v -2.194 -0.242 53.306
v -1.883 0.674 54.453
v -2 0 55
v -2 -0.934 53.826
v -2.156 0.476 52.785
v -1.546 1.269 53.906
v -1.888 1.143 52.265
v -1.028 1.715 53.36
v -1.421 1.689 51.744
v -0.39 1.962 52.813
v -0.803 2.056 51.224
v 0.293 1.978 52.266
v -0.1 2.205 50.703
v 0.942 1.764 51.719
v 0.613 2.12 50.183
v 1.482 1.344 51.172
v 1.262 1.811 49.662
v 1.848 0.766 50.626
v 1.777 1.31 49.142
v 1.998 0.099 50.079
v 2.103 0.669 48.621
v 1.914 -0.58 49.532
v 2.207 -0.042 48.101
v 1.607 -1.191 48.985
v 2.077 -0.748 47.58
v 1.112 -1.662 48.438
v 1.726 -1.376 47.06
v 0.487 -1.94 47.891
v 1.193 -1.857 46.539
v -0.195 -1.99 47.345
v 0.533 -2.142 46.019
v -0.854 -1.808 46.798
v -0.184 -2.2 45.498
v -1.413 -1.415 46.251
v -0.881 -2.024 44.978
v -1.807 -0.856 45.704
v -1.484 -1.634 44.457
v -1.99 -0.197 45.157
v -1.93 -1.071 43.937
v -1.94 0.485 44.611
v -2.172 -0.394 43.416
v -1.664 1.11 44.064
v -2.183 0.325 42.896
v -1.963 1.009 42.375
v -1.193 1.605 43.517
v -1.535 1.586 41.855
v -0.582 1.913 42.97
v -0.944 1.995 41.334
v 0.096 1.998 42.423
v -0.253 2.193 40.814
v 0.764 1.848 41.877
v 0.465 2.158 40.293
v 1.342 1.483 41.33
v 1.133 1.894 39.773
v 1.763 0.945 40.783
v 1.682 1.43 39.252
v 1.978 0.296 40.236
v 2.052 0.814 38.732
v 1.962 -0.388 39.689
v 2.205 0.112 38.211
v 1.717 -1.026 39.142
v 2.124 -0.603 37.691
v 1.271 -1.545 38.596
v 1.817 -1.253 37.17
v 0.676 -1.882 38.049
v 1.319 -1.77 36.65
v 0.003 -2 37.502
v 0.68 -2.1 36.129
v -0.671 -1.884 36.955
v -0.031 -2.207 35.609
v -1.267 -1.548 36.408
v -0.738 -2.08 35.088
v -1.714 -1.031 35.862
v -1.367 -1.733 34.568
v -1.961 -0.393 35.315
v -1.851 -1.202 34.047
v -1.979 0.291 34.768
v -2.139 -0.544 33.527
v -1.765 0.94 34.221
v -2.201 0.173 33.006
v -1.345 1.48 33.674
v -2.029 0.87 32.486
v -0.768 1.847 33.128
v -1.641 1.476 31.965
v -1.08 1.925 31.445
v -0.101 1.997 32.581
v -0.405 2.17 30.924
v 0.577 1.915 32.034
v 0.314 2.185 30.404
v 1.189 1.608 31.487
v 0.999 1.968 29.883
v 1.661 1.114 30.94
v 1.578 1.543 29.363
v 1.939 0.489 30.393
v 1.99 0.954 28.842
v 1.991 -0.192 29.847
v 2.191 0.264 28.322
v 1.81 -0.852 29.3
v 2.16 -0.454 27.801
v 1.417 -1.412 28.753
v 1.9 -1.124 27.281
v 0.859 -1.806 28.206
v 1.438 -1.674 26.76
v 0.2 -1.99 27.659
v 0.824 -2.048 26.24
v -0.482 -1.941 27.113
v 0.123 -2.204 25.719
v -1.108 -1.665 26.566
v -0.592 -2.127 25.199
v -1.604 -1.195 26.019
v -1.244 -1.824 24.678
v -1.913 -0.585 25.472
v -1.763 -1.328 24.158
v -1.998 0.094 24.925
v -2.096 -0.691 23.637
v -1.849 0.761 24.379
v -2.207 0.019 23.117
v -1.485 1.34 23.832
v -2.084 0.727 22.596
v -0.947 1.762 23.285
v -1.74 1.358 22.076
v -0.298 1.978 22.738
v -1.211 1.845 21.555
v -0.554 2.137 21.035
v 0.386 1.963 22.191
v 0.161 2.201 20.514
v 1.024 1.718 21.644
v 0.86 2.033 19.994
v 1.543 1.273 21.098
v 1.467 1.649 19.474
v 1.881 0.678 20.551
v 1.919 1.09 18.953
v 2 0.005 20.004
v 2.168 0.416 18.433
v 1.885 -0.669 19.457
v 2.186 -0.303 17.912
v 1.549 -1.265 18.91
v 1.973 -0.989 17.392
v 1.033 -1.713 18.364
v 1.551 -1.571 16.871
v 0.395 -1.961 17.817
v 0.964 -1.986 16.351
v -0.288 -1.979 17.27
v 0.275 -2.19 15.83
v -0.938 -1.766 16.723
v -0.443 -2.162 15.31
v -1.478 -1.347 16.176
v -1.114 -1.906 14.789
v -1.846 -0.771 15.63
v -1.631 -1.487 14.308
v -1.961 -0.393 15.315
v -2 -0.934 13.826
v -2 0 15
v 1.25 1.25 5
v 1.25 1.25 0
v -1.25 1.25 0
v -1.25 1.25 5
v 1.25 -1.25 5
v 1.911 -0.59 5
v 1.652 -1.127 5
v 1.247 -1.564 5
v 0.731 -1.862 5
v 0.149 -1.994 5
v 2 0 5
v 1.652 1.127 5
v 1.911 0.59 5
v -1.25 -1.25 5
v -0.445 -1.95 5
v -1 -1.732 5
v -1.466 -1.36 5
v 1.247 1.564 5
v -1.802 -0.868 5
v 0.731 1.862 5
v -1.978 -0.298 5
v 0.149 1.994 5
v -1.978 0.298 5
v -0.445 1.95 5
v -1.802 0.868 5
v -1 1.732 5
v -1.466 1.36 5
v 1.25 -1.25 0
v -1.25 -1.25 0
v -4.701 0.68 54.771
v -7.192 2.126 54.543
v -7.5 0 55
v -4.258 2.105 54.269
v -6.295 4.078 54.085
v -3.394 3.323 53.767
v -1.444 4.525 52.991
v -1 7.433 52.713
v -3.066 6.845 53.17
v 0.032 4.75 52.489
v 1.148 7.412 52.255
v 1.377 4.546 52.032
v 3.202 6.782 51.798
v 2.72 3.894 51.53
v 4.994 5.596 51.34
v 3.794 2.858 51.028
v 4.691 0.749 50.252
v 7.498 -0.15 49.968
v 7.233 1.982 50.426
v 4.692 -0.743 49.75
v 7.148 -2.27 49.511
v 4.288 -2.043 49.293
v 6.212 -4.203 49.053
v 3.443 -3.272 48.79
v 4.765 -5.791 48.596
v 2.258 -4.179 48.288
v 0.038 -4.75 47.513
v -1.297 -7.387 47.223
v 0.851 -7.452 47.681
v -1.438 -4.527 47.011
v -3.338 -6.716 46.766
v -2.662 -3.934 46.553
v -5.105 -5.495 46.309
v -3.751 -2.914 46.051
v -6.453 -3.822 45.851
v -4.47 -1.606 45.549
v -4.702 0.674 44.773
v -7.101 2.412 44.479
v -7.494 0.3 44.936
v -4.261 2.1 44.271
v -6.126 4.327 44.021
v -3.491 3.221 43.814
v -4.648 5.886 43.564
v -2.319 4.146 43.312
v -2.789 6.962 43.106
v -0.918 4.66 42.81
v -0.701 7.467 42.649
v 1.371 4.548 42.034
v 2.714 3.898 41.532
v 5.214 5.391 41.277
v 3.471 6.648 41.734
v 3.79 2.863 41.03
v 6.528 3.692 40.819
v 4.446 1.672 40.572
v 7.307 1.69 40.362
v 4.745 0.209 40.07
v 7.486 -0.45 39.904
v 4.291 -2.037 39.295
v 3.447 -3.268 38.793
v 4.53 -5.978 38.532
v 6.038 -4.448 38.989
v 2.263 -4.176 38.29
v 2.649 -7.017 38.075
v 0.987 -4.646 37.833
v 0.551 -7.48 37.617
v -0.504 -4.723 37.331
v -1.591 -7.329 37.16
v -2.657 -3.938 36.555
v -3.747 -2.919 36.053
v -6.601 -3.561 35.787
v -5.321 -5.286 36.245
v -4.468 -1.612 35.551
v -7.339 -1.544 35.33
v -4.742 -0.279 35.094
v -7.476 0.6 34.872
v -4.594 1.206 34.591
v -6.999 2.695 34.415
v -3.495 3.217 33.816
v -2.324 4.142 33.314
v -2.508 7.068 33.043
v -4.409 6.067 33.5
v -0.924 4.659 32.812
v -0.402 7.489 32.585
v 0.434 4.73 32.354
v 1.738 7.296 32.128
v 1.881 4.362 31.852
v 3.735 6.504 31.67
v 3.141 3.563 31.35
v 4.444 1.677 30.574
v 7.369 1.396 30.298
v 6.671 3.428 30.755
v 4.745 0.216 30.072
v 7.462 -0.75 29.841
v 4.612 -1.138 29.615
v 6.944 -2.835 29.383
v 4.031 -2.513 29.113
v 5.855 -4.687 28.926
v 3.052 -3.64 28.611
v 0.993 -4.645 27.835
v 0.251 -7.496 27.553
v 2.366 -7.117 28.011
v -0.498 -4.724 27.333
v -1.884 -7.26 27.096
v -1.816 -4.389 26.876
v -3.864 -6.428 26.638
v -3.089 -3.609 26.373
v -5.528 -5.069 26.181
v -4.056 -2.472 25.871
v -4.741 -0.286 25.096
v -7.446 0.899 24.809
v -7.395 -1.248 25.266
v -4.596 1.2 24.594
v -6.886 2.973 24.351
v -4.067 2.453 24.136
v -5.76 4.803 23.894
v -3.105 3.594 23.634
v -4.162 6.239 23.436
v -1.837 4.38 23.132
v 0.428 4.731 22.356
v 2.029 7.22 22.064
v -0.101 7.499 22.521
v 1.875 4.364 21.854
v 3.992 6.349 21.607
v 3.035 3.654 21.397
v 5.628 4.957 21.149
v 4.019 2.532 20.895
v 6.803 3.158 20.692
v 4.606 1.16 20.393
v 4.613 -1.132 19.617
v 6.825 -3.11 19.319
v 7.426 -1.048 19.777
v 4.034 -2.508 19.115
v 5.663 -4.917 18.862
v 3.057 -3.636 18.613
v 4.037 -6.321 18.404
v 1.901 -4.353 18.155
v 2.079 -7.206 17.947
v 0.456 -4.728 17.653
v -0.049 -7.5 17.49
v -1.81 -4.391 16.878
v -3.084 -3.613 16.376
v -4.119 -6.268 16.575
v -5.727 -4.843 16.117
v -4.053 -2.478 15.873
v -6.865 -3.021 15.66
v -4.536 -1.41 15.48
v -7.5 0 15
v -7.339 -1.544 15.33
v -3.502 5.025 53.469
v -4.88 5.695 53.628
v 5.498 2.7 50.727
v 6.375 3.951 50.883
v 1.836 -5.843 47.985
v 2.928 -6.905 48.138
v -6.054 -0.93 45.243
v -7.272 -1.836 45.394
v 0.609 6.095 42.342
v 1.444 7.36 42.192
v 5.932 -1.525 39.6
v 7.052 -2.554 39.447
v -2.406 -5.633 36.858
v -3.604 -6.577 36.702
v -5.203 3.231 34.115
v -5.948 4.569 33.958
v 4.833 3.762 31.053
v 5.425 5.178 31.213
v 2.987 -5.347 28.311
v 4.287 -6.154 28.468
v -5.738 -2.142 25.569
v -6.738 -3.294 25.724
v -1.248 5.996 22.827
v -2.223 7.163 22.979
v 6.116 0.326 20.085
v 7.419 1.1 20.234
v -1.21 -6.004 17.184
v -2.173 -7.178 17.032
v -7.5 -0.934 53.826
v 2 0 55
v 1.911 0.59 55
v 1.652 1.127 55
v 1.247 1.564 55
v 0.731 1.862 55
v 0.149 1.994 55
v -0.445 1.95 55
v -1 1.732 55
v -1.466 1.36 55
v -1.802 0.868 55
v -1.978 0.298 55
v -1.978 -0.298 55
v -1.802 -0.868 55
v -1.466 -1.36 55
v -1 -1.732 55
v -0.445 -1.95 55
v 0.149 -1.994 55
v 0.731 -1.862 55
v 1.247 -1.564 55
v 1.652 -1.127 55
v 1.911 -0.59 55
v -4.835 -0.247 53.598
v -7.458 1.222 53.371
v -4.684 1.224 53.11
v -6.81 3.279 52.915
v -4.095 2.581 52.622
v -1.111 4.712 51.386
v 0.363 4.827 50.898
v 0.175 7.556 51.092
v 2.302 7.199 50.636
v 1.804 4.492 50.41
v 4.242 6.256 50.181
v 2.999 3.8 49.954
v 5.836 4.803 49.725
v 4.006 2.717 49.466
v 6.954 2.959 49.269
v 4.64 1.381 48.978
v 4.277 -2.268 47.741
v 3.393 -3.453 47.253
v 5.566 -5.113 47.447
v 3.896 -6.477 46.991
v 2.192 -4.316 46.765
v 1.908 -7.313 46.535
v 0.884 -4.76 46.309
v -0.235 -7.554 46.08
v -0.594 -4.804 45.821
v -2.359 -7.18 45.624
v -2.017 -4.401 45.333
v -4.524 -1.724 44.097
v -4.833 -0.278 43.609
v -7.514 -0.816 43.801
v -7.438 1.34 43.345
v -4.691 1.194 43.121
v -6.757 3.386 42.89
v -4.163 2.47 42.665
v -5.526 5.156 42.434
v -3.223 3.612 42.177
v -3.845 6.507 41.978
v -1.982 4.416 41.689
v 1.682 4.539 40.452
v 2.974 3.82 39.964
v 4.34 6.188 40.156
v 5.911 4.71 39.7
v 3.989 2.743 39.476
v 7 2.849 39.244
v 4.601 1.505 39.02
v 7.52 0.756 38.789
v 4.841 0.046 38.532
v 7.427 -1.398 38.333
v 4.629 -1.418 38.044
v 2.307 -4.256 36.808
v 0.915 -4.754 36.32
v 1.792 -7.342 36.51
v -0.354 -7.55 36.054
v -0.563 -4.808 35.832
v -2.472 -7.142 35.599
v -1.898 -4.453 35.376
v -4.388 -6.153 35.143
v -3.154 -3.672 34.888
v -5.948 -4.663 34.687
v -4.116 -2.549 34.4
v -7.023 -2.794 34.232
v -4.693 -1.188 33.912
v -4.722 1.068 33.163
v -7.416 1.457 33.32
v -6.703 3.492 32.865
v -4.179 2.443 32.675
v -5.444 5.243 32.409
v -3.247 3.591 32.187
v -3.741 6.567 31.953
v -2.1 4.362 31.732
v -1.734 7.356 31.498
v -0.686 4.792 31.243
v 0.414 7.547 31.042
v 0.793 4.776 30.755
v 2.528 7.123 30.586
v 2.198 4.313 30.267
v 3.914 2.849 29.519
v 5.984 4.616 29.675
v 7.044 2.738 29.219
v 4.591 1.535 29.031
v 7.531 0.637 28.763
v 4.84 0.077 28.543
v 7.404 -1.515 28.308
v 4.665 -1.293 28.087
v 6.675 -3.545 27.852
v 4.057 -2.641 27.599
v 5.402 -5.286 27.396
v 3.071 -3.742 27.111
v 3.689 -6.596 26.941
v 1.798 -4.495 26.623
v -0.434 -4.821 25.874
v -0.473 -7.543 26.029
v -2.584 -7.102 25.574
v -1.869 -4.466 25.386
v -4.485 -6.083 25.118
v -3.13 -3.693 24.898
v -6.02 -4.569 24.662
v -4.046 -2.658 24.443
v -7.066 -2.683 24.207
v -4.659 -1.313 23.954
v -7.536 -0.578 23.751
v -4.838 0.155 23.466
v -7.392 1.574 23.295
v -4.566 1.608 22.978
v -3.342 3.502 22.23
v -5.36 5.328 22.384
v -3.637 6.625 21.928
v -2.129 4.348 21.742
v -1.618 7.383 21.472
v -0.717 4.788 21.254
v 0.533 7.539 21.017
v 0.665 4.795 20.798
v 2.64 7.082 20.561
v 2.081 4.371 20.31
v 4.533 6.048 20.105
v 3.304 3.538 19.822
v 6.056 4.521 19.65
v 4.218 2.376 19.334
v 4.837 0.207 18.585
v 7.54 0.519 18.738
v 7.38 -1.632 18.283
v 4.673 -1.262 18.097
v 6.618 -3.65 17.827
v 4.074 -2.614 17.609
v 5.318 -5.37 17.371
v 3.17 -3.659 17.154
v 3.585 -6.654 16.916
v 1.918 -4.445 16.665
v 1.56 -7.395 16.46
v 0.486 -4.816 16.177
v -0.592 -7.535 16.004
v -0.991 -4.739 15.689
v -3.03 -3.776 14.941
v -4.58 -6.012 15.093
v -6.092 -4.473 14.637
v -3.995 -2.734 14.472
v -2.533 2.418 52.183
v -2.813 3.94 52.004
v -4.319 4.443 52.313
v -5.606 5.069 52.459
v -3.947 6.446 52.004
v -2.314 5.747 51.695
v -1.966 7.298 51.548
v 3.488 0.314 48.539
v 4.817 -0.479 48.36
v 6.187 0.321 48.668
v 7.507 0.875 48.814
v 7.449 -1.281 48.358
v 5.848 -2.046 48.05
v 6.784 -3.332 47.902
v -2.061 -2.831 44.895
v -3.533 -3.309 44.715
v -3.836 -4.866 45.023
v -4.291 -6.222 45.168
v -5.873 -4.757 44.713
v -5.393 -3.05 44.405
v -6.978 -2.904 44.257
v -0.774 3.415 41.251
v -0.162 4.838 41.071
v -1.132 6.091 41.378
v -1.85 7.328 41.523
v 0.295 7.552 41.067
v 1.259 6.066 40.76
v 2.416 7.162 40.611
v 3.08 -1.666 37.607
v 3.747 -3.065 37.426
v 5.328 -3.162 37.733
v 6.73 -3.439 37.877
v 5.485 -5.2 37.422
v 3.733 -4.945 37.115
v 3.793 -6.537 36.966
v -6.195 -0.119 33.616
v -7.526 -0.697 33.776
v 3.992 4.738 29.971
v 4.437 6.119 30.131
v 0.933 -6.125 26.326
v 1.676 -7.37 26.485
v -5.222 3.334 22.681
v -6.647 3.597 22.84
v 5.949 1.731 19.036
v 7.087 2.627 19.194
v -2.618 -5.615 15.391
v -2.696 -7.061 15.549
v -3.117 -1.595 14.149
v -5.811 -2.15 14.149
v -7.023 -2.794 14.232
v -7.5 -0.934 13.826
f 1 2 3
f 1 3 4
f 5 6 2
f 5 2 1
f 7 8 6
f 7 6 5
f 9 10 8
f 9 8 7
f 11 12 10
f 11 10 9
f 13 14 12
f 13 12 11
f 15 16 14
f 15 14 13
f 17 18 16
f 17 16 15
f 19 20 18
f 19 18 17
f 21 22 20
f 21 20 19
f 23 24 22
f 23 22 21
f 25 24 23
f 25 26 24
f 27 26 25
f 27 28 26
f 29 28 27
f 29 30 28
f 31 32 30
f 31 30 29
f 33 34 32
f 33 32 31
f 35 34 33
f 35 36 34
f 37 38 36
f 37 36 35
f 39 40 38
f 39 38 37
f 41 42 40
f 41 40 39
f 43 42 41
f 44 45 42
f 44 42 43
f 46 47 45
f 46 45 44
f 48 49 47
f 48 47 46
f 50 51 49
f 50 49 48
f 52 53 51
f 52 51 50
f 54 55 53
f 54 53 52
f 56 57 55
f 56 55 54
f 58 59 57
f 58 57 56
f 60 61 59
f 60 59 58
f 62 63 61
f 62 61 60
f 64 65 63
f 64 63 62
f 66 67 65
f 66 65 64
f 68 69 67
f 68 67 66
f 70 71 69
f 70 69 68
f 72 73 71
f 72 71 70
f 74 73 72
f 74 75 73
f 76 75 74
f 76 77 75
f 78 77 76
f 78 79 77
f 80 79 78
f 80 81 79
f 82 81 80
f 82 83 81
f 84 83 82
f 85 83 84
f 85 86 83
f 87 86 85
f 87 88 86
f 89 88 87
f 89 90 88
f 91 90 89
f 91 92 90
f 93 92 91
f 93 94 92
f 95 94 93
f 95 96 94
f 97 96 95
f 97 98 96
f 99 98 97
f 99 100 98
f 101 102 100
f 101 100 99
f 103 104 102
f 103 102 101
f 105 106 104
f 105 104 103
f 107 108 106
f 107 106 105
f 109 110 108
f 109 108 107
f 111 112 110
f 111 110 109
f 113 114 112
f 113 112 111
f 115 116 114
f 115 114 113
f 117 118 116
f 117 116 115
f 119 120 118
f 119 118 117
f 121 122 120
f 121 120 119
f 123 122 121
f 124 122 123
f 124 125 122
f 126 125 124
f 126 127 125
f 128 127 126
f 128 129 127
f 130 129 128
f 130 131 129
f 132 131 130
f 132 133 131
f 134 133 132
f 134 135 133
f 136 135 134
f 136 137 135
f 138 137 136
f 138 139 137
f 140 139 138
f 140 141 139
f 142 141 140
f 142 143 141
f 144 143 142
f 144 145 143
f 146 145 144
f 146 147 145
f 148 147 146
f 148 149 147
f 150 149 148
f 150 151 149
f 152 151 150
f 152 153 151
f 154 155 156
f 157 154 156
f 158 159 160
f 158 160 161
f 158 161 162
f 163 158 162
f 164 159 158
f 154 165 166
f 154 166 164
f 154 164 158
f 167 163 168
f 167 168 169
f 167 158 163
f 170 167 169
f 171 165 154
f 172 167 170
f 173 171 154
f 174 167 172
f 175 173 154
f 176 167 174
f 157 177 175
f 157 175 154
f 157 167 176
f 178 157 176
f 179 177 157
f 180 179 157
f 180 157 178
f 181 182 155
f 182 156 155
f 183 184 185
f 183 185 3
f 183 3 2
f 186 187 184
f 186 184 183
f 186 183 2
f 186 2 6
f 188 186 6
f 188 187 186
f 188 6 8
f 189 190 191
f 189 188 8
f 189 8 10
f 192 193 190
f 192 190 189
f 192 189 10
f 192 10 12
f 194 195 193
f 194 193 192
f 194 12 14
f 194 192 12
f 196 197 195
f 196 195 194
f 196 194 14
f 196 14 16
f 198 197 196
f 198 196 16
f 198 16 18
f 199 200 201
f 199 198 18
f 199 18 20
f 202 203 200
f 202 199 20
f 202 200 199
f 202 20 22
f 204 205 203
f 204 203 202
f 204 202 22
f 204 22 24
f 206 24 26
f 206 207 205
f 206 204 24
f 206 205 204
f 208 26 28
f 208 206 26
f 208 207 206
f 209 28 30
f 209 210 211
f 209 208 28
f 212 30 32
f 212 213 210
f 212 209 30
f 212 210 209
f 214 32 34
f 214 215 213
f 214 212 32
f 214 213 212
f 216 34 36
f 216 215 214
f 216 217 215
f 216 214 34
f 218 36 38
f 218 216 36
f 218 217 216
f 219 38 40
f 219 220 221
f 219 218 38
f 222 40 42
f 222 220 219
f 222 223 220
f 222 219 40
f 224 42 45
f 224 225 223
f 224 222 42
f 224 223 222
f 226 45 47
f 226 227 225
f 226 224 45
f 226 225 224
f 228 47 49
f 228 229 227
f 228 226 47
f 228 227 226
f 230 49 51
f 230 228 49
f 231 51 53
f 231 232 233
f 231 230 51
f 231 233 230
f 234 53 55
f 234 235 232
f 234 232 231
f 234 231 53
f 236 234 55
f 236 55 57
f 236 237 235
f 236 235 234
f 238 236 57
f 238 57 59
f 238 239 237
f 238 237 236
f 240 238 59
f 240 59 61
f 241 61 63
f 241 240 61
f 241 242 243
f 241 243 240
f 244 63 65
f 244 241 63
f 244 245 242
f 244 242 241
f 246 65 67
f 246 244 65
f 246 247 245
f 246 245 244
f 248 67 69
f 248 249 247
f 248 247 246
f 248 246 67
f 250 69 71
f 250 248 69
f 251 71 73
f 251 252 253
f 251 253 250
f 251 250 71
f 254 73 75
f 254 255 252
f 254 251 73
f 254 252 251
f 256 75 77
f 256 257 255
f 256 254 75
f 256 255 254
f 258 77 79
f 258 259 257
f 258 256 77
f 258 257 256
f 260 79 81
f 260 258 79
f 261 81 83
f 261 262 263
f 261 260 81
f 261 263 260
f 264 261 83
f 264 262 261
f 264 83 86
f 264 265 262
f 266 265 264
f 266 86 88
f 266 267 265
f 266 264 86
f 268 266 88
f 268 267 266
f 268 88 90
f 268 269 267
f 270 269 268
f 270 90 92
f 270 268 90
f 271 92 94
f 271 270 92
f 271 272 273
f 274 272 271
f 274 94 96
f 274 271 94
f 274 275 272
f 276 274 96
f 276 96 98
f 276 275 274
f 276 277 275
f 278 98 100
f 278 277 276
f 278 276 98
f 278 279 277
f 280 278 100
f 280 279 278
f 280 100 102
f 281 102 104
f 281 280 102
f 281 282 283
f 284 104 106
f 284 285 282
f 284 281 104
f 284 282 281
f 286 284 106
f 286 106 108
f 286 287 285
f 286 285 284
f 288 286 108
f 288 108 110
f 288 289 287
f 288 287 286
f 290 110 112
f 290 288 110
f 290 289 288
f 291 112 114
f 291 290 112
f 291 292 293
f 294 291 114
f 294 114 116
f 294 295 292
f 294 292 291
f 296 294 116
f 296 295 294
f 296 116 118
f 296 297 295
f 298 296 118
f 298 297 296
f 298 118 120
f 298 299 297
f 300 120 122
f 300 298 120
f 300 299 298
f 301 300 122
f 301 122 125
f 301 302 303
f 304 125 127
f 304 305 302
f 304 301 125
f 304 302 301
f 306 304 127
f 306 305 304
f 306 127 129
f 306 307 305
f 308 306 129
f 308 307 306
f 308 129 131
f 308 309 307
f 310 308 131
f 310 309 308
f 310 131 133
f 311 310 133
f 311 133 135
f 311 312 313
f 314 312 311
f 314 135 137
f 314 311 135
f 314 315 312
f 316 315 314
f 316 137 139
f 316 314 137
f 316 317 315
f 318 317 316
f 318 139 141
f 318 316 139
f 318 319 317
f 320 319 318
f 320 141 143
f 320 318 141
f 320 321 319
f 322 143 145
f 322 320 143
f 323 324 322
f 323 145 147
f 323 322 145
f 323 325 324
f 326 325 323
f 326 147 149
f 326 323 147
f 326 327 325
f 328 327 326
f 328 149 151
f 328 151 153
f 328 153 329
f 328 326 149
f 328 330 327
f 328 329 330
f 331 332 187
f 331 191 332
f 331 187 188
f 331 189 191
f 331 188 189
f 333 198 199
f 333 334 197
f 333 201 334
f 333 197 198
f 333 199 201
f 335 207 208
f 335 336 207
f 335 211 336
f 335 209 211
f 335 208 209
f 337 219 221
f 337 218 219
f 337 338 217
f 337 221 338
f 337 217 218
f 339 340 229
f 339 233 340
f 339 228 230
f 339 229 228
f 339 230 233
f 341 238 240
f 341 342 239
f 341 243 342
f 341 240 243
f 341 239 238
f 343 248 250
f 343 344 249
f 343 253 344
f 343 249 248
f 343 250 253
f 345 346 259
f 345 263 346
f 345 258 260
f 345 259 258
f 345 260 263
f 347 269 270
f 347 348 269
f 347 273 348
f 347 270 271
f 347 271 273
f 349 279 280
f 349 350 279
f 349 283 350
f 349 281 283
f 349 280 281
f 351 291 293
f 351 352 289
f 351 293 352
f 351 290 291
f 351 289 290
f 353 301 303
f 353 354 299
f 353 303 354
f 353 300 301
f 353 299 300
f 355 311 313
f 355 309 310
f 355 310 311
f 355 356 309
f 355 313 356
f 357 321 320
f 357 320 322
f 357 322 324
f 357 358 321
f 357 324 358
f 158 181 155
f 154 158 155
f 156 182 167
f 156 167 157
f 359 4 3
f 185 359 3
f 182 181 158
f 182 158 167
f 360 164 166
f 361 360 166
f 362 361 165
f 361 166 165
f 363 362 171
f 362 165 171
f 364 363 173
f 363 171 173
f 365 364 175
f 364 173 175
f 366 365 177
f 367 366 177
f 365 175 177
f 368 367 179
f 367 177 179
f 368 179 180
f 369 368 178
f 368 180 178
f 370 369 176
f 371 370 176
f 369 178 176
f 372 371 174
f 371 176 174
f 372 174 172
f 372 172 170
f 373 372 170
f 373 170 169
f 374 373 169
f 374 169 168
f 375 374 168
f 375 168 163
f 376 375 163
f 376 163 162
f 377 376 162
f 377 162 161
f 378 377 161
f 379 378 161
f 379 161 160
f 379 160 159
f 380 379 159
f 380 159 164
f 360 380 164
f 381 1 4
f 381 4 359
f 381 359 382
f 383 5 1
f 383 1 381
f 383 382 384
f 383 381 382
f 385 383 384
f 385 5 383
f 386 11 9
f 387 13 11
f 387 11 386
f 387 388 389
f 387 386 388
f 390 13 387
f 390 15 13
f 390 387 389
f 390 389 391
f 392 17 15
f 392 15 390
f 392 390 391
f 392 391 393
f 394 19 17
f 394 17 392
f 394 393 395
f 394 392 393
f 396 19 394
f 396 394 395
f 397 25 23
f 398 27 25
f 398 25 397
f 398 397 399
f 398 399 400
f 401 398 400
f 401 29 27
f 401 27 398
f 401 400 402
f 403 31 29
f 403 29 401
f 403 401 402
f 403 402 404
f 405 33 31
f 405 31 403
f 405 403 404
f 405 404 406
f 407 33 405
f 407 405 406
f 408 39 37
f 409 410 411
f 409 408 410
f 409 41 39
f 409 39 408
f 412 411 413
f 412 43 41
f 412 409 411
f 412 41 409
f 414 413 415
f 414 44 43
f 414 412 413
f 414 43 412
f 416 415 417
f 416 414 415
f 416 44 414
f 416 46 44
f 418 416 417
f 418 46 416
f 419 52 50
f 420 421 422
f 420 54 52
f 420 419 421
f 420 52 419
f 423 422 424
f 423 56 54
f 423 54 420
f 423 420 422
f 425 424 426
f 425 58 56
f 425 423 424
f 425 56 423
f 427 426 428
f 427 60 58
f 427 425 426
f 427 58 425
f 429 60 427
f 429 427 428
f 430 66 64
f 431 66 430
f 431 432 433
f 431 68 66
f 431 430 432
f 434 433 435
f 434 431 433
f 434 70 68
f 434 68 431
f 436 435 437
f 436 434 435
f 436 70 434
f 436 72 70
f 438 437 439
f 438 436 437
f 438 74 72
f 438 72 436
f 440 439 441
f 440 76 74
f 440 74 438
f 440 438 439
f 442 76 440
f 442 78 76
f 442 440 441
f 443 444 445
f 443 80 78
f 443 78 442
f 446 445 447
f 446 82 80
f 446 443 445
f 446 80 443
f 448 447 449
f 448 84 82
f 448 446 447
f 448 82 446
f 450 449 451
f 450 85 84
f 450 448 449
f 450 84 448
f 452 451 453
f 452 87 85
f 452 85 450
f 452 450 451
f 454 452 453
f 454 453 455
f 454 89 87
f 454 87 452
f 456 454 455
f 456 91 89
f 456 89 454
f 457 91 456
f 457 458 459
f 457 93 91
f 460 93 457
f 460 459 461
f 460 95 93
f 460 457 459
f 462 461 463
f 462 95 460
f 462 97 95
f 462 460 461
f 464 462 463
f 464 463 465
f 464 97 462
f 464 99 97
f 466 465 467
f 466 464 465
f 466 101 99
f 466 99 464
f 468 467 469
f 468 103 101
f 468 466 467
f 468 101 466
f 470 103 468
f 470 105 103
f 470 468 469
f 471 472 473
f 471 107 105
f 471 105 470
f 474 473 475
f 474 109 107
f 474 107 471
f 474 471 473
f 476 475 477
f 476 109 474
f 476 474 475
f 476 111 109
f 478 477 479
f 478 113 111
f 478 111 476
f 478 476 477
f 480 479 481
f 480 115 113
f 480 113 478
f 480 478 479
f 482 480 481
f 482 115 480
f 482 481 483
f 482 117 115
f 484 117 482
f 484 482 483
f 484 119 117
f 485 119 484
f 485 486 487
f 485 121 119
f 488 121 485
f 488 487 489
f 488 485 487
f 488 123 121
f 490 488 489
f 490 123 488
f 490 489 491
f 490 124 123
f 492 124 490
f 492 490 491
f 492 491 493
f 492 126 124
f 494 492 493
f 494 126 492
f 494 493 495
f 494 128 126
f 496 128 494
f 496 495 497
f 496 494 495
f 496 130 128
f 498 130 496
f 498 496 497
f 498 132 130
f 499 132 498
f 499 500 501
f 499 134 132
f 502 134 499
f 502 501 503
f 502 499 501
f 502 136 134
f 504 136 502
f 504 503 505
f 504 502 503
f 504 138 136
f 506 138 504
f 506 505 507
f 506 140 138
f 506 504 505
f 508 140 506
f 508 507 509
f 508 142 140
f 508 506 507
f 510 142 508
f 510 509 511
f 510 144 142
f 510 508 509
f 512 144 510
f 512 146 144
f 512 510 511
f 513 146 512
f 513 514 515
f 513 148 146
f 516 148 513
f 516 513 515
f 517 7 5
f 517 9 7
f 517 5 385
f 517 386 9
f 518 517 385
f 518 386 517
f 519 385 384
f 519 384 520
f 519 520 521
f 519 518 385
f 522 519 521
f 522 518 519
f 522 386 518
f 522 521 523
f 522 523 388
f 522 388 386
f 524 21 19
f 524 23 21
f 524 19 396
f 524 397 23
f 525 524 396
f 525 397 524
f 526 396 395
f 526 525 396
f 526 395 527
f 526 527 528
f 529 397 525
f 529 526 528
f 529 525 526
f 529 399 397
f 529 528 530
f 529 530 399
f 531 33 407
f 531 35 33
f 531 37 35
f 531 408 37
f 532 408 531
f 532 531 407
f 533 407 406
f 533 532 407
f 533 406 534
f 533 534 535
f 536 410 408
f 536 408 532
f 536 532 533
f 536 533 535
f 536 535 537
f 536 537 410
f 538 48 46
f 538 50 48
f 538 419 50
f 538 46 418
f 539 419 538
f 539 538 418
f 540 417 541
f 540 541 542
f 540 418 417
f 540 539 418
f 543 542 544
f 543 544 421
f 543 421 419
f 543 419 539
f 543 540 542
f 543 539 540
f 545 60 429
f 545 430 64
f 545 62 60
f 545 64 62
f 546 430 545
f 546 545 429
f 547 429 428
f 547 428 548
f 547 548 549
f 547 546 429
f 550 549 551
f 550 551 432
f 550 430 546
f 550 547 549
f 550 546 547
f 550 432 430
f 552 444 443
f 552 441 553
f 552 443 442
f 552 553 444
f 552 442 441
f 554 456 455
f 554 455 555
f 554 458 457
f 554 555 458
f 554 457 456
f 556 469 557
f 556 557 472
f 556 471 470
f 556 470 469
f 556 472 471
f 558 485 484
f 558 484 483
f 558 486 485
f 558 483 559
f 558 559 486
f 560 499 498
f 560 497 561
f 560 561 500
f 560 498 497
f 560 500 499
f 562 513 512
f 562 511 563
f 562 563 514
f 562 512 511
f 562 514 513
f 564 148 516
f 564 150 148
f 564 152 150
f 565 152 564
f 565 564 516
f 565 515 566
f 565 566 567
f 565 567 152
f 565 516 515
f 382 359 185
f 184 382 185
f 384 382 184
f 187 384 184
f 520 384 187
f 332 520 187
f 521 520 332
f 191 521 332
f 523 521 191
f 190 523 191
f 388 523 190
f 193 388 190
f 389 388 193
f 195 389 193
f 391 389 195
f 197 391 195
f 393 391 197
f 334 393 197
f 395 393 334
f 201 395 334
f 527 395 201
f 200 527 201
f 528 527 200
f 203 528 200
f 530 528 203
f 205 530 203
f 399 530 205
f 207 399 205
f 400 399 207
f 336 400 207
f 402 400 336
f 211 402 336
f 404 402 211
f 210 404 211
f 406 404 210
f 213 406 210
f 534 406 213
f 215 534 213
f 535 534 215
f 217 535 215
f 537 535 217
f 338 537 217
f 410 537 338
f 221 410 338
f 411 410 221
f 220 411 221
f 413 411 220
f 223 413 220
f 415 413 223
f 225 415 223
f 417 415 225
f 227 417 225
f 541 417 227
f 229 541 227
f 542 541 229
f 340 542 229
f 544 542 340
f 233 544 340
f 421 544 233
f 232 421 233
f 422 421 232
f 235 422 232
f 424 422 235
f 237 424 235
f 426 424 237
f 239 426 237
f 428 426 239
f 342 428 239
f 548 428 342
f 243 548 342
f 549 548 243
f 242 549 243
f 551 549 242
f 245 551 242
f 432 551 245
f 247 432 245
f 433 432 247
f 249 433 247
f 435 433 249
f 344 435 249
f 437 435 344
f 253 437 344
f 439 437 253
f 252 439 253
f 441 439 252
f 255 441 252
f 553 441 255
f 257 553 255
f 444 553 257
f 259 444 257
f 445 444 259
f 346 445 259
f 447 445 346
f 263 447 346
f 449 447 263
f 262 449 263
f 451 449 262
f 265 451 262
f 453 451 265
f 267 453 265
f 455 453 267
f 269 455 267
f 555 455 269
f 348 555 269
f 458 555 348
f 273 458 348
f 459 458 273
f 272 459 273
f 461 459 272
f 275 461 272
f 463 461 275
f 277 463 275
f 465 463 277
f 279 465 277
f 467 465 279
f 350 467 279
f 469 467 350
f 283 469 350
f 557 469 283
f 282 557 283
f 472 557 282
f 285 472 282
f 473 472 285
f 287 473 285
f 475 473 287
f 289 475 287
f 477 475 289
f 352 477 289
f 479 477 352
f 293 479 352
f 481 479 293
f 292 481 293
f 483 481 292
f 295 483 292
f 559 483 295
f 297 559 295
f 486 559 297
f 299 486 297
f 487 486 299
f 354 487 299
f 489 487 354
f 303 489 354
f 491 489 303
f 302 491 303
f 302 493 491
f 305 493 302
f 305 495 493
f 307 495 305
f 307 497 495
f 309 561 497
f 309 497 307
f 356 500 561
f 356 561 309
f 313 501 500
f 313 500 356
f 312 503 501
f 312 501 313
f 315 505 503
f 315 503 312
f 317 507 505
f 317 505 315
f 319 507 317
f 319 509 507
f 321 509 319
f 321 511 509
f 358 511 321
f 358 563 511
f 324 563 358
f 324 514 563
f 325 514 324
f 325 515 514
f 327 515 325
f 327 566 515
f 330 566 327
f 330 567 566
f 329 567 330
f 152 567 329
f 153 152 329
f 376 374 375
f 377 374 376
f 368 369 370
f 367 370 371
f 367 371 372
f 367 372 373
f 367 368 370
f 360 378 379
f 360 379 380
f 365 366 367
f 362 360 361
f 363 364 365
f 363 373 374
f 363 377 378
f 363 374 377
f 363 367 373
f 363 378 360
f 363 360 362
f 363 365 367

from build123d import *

# Parameters (mm, degrees)
SKETCH1_R           = 2
BOSS_EXTRUDE1_DEPTH = 55
SWEEP1_PITCH        = 10
SWEEP1_HEIGHT       = 40
SWEEP1_RADIUS       = 2
SKETCH8_W           = 5.5
SKETCH8_H           = 1.5
SKETCH9_W           = 4.5
SKETCH9_H           = 4.5
SKETCH9_W_2         = 2.5
SKETCH9_H_2         = 2.5
CUT_EXTRUDE1_DEPTH  = 5


with BuildPart() as part:
    # Sketch1 → Boss-Extrude1 (new body)
    with BuildSketch(Plane.XY):
        Circle(SKETCH1_R)
    extrude(amount=BOSS_EXTRUDE1_DEPTH)

    # Sketch9 → Cut-Extrude1 (cut)
    with BuildSketch(Plane(origin=(0, 0, 0), x_dir=(-1, 0, 0), z_dir=(0, 0, -1))):
        Rectangle(SKETCH9_W, SKETCH9_H)
        Rectangle(SKETCH9_W_2, SKETCH9_H_2, mode=Mode.SUBTRACT)
    extrude(amount=-CUT_EXTRUDE1_DEPTH, mode=Mode.SUBTRACT)


with BuildPart() as body_2:
    # Sweep1: sweep along a helix
    with BuildLine() as sweep1_path:
        Helix(SWEEP1_PITCH, SWEEP1_HEIGHT, SWEEP1_RADIUS, center=(0, 0, 55), direction=(0, 0, -1))
    # Sketch8 → Sweep1 (sweep)
    with BuildSketch(Plane(origin=(-2, 0, 55), x_dir=(-1, 0, 0), z_dir=(-5.205240891921112e-15, 0.782478985826999, -0.6226769922994995))):
        with Locations((2.75, -0.75)):
            Rectangle(SKETCH8_W, SKETCH8_H)
    sweep(path=sweep1_path.line, is_frenet=True)


solid = Compound([part.part, body_2.part])
